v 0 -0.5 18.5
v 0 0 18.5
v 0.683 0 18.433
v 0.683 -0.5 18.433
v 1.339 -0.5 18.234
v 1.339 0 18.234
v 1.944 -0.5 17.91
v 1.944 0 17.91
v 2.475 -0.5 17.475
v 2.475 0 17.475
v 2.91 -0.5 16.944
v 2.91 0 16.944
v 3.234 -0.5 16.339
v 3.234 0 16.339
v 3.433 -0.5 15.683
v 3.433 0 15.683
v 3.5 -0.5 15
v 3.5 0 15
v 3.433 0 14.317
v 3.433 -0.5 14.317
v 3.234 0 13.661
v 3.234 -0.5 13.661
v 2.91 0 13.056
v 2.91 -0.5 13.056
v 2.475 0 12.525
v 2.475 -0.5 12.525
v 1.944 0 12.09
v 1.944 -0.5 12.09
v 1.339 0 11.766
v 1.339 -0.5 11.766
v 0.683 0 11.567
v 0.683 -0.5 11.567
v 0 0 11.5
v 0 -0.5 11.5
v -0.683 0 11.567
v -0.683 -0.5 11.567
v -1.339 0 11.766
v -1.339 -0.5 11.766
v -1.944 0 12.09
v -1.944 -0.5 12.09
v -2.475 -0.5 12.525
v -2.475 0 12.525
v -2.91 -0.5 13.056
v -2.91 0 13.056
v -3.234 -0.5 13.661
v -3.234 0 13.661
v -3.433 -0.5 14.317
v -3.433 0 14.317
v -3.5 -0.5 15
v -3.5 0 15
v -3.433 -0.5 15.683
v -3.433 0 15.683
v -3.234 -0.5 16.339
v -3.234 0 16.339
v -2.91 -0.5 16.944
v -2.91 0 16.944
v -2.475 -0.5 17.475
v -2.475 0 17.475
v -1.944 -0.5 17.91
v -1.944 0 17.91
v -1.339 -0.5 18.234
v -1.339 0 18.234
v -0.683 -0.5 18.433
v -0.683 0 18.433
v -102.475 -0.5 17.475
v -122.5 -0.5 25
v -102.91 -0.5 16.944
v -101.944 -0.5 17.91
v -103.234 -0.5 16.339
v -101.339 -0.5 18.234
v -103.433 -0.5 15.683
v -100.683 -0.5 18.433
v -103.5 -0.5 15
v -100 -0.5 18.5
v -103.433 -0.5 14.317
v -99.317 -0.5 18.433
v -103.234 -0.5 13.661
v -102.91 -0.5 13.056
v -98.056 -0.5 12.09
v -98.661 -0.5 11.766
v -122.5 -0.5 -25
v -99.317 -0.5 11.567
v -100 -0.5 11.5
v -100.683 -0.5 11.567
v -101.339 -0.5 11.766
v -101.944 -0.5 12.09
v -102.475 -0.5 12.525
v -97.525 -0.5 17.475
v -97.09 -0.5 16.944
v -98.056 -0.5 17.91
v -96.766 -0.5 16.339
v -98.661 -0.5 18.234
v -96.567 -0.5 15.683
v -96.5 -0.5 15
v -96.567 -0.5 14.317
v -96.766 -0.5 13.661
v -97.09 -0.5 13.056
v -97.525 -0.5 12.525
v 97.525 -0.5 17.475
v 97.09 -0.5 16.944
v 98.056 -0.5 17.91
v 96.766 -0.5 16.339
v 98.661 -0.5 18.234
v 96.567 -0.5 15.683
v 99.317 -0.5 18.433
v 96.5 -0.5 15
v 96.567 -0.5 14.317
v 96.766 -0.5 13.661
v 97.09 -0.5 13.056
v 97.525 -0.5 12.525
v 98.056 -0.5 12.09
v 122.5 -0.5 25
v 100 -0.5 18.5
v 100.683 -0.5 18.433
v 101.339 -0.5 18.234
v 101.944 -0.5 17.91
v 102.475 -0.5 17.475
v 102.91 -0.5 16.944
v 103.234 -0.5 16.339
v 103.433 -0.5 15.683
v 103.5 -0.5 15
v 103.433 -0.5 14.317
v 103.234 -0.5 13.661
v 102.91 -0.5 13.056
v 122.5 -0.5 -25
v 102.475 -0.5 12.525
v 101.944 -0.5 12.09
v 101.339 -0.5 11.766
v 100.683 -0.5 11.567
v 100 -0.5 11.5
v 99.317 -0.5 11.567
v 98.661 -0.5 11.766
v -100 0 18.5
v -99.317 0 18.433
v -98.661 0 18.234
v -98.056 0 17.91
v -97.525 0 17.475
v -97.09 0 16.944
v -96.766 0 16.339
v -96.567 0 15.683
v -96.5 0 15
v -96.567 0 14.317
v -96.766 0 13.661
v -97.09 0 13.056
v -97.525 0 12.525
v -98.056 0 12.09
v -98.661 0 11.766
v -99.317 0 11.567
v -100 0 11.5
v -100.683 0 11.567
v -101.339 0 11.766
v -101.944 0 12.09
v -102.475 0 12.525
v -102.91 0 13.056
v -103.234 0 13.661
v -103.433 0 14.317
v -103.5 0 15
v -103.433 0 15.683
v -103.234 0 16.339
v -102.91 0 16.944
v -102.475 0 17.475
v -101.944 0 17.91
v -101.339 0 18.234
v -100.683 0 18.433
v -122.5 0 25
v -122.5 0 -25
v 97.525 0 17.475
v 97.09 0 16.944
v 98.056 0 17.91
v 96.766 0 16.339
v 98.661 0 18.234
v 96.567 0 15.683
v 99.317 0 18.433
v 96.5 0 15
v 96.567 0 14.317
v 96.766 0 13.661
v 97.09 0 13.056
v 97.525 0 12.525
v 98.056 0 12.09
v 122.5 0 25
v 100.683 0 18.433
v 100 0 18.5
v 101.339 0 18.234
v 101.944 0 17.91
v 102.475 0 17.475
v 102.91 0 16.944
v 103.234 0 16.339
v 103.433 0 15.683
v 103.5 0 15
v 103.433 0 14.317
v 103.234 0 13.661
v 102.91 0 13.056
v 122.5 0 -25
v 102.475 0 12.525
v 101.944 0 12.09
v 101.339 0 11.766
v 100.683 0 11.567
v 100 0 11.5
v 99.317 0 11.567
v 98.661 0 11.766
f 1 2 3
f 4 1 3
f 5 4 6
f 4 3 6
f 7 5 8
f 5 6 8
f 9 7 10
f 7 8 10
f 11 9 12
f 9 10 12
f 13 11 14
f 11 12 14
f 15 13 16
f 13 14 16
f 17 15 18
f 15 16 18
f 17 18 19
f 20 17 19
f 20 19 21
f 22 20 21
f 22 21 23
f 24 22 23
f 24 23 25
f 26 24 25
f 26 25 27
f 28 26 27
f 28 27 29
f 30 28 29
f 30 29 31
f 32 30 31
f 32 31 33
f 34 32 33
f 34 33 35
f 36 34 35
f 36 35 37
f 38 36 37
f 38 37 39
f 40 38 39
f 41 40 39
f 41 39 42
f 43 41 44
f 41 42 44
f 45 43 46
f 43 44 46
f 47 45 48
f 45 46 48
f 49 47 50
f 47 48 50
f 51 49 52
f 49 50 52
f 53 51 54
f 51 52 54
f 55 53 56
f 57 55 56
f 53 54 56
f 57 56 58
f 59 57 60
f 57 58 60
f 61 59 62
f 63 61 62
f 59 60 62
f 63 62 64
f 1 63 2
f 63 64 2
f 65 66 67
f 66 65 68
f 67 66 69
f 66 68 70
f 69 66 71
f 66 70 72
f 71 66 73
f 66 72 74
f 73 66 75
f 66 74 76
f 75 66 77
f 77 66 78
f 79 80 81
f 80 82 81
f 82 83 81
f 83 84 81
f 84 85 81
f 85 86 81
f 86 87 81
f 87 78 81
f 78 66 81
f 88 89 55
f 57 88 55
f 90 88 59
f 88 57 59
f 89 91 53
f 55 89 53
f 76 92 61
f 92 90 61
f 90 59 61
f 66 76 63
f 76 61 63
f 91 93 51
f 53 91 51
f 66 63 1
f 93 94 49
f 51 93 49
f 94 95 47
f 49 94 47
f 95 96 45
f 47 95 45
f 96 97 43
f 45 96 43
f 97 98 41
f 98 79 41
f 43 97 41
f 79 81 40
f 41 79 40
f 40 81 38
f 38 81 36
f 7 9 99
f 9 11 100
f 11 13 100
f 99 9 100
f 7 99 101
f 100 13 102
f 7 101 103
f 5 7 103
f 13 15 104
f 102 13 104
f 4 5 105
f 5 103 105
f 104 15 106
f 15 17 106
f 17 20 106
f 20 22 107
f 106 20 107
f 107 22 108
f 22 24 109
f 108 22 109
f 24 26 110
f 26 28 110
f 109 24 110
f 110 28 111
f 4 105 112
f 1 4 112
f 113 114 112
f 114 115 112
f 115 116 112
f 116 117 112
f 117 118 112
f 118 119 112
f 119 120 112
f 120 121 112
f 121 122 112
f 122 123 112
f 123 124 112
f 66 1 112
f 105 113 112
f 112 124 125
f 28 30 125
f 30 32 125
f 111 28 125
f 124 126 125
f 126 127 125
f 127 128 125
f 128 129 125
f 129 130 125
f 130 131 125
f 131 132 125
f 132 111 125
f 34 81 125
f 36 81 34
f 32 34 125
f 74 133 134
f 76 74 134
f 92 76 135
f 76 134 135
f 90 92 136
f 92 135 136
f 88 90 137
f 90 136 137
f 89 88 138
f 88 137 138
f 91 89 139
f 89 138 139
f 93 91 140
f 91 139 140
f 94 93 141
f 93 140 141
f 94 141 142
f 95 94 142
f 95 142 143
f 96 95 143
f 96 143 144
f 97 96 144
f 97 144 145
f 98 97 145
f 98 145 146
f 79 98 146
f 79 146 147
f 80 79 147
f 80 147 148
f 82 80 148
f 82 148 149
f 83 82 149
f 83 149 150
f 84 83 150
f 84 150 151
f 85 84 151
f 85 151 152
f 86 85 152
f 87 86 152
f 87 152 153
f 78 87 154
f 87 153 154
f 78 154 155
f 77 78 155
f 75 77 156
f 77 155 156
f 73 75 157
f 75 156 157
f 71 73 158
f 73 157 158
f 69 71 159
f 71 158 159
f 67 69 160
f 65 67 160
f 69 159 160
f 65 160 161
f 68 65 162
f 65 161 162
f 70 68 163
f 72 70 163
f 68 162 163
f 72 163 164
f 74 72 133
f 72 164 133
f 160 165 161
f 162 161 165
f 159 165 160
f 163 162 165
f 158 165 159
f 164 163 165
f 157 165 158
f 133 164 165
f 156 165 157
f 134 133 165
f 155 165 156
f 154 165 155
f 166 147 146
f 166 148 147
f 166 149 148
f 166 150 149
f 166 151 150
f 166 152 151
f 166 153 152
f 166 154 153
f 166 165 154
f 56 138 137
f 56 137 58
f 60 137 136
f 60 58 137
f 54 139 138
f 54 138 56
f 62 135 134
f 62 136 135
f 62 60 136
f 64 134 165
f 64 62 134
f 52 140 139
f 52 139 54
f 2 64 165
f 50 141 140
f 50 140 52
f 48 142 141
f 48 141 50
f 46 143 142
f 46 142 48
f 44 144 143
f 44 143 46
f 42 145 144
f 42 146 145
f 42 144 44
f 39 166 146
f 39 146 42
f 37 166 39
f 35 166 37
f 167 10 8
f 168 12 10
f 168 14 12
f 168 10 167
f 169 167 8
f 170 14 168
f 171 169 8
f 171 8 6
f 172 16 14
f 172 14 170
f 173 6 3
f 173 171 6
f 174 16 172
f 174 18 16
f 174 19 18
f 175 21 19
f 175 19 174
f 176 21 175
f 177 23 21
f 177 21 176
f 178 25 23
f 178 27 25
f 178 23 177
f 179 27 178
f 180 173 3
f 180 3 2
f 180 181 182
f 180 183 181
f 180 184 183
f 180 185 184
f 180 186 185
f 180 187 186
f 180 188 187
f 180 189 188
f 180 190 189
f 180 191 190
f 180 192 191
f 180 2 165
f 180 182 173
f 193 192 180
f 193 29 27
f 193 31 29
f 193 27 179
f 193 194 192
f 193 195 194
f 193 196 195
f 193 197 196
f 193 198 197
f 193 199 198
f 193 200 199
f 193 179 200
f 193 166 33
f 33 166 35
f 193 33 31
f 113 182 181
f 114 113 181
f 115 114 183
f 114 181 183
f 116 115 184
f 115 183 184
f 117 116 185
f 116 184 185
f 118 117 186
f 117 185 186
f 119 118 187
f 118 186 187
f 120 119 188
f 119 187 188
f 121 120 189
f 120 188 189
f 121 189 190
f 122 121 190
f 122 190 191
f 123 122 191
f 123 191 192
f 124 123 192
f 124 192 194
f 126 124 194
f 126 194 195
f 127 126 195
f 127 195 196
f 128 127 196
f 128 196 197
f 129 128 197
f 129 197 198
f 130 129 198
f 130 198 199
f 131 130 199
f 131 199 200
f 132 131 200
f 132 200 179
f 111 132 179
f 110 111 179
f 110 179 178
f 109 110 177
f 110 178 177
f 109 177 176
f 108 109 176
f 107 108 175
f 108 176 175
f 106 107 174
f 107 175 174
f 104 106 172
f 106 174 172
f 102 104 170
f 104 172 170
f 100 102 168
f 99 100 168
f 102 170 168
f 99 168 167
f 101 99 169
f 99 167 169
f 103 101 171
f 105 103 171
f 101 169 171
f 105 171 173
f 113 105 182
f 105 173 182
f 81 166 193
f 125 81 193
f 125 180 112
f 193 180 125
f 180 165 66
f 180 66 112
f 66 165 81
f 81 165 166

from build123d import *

# Parameters (mm, degrees)
SKETCH1_W            = 245
SKETCH1_H            = 50
BASE_FLANGE1_DEPTH   = 0.5
SKETCH6_R            = 3.5
CUT_EXTRUDE1_DEPTH   = 10
LPATTERN1_COUNT      = 6
LPATTERN1_PITCH      = 146
LPATTERN1_COUNT_DIR2 = 6
LPATTERN1_PITCH_DIR2 = 146
LPATTERN2_COUNT      = 2
LPATTERN2_PITCH      = 100
LPATTERN2_COL_COUNT  = 2
LPATTERN2_COL_PITCH  = 100


# Sheet-metal steps are written as plain solids
with BuildPart() as part:
    # Sketch1 → Base-Flange1 (new body)
    with BuildSketch(Plane(origin=(0, 0, 0), x_dir=(1, 0, 0), z_dir=(0, 1, 0))):
        Rectangle(SKETCH1_W, SKETCH1_H)
    extrude(amount=-BASE_FLANGE1_DEPTH)

    # Sketch6 → Cut-Extrude1 (cut)
    with BuildSketch(Plane(origin=(0, 0, 0), x_dir=(1, 0, 0), z_dir=(0, 1, 0))):
        with Locations(Location((0, -15, 0), (0, 0, 270))):
            Circle(SKETCH6_R)
    cut_extrude1 = extrude(amount=-CUT_EXTRUDE1_DEPTH, mode=Mode.SUBTRACT)

    # LPattern1: Cut-Extrude1 6 × 6
    with Locations(*[Vector(-1, 0, 0) * (i * LPATTERN1_PITCH) + Vector(1, 0, 0) * (j * LPATTERN1_PITCH_DIR2) for i in range(LPATTERN1_COUNT) for j in range(LPATTERN1_COUNT_DIR2) if (i, j) != (0, 0)]):
        add(cut_extrude1, mode=Mode.SUBTRACT)

    # LPattern2: Cut-Extrude1 ×2
    with Locations(*[(-i * LPATTERN2_PITCH, 0, 0) for i in range(1, LPATTERN2_COUNT)]):
        add(cut_extrude1, mode=Mode.SUBTRACT)

    # LPattern2 col: Cut-Extrude1 ×2
    with Locations(*[(i * LPATTERN2_COL_PITCH, 0, 0) for i in range(1, LPATTERN2_COL_COUNT)]):
        add(cut_extrude1, mode=Mode.SUBTRACT)


solid = part.part
